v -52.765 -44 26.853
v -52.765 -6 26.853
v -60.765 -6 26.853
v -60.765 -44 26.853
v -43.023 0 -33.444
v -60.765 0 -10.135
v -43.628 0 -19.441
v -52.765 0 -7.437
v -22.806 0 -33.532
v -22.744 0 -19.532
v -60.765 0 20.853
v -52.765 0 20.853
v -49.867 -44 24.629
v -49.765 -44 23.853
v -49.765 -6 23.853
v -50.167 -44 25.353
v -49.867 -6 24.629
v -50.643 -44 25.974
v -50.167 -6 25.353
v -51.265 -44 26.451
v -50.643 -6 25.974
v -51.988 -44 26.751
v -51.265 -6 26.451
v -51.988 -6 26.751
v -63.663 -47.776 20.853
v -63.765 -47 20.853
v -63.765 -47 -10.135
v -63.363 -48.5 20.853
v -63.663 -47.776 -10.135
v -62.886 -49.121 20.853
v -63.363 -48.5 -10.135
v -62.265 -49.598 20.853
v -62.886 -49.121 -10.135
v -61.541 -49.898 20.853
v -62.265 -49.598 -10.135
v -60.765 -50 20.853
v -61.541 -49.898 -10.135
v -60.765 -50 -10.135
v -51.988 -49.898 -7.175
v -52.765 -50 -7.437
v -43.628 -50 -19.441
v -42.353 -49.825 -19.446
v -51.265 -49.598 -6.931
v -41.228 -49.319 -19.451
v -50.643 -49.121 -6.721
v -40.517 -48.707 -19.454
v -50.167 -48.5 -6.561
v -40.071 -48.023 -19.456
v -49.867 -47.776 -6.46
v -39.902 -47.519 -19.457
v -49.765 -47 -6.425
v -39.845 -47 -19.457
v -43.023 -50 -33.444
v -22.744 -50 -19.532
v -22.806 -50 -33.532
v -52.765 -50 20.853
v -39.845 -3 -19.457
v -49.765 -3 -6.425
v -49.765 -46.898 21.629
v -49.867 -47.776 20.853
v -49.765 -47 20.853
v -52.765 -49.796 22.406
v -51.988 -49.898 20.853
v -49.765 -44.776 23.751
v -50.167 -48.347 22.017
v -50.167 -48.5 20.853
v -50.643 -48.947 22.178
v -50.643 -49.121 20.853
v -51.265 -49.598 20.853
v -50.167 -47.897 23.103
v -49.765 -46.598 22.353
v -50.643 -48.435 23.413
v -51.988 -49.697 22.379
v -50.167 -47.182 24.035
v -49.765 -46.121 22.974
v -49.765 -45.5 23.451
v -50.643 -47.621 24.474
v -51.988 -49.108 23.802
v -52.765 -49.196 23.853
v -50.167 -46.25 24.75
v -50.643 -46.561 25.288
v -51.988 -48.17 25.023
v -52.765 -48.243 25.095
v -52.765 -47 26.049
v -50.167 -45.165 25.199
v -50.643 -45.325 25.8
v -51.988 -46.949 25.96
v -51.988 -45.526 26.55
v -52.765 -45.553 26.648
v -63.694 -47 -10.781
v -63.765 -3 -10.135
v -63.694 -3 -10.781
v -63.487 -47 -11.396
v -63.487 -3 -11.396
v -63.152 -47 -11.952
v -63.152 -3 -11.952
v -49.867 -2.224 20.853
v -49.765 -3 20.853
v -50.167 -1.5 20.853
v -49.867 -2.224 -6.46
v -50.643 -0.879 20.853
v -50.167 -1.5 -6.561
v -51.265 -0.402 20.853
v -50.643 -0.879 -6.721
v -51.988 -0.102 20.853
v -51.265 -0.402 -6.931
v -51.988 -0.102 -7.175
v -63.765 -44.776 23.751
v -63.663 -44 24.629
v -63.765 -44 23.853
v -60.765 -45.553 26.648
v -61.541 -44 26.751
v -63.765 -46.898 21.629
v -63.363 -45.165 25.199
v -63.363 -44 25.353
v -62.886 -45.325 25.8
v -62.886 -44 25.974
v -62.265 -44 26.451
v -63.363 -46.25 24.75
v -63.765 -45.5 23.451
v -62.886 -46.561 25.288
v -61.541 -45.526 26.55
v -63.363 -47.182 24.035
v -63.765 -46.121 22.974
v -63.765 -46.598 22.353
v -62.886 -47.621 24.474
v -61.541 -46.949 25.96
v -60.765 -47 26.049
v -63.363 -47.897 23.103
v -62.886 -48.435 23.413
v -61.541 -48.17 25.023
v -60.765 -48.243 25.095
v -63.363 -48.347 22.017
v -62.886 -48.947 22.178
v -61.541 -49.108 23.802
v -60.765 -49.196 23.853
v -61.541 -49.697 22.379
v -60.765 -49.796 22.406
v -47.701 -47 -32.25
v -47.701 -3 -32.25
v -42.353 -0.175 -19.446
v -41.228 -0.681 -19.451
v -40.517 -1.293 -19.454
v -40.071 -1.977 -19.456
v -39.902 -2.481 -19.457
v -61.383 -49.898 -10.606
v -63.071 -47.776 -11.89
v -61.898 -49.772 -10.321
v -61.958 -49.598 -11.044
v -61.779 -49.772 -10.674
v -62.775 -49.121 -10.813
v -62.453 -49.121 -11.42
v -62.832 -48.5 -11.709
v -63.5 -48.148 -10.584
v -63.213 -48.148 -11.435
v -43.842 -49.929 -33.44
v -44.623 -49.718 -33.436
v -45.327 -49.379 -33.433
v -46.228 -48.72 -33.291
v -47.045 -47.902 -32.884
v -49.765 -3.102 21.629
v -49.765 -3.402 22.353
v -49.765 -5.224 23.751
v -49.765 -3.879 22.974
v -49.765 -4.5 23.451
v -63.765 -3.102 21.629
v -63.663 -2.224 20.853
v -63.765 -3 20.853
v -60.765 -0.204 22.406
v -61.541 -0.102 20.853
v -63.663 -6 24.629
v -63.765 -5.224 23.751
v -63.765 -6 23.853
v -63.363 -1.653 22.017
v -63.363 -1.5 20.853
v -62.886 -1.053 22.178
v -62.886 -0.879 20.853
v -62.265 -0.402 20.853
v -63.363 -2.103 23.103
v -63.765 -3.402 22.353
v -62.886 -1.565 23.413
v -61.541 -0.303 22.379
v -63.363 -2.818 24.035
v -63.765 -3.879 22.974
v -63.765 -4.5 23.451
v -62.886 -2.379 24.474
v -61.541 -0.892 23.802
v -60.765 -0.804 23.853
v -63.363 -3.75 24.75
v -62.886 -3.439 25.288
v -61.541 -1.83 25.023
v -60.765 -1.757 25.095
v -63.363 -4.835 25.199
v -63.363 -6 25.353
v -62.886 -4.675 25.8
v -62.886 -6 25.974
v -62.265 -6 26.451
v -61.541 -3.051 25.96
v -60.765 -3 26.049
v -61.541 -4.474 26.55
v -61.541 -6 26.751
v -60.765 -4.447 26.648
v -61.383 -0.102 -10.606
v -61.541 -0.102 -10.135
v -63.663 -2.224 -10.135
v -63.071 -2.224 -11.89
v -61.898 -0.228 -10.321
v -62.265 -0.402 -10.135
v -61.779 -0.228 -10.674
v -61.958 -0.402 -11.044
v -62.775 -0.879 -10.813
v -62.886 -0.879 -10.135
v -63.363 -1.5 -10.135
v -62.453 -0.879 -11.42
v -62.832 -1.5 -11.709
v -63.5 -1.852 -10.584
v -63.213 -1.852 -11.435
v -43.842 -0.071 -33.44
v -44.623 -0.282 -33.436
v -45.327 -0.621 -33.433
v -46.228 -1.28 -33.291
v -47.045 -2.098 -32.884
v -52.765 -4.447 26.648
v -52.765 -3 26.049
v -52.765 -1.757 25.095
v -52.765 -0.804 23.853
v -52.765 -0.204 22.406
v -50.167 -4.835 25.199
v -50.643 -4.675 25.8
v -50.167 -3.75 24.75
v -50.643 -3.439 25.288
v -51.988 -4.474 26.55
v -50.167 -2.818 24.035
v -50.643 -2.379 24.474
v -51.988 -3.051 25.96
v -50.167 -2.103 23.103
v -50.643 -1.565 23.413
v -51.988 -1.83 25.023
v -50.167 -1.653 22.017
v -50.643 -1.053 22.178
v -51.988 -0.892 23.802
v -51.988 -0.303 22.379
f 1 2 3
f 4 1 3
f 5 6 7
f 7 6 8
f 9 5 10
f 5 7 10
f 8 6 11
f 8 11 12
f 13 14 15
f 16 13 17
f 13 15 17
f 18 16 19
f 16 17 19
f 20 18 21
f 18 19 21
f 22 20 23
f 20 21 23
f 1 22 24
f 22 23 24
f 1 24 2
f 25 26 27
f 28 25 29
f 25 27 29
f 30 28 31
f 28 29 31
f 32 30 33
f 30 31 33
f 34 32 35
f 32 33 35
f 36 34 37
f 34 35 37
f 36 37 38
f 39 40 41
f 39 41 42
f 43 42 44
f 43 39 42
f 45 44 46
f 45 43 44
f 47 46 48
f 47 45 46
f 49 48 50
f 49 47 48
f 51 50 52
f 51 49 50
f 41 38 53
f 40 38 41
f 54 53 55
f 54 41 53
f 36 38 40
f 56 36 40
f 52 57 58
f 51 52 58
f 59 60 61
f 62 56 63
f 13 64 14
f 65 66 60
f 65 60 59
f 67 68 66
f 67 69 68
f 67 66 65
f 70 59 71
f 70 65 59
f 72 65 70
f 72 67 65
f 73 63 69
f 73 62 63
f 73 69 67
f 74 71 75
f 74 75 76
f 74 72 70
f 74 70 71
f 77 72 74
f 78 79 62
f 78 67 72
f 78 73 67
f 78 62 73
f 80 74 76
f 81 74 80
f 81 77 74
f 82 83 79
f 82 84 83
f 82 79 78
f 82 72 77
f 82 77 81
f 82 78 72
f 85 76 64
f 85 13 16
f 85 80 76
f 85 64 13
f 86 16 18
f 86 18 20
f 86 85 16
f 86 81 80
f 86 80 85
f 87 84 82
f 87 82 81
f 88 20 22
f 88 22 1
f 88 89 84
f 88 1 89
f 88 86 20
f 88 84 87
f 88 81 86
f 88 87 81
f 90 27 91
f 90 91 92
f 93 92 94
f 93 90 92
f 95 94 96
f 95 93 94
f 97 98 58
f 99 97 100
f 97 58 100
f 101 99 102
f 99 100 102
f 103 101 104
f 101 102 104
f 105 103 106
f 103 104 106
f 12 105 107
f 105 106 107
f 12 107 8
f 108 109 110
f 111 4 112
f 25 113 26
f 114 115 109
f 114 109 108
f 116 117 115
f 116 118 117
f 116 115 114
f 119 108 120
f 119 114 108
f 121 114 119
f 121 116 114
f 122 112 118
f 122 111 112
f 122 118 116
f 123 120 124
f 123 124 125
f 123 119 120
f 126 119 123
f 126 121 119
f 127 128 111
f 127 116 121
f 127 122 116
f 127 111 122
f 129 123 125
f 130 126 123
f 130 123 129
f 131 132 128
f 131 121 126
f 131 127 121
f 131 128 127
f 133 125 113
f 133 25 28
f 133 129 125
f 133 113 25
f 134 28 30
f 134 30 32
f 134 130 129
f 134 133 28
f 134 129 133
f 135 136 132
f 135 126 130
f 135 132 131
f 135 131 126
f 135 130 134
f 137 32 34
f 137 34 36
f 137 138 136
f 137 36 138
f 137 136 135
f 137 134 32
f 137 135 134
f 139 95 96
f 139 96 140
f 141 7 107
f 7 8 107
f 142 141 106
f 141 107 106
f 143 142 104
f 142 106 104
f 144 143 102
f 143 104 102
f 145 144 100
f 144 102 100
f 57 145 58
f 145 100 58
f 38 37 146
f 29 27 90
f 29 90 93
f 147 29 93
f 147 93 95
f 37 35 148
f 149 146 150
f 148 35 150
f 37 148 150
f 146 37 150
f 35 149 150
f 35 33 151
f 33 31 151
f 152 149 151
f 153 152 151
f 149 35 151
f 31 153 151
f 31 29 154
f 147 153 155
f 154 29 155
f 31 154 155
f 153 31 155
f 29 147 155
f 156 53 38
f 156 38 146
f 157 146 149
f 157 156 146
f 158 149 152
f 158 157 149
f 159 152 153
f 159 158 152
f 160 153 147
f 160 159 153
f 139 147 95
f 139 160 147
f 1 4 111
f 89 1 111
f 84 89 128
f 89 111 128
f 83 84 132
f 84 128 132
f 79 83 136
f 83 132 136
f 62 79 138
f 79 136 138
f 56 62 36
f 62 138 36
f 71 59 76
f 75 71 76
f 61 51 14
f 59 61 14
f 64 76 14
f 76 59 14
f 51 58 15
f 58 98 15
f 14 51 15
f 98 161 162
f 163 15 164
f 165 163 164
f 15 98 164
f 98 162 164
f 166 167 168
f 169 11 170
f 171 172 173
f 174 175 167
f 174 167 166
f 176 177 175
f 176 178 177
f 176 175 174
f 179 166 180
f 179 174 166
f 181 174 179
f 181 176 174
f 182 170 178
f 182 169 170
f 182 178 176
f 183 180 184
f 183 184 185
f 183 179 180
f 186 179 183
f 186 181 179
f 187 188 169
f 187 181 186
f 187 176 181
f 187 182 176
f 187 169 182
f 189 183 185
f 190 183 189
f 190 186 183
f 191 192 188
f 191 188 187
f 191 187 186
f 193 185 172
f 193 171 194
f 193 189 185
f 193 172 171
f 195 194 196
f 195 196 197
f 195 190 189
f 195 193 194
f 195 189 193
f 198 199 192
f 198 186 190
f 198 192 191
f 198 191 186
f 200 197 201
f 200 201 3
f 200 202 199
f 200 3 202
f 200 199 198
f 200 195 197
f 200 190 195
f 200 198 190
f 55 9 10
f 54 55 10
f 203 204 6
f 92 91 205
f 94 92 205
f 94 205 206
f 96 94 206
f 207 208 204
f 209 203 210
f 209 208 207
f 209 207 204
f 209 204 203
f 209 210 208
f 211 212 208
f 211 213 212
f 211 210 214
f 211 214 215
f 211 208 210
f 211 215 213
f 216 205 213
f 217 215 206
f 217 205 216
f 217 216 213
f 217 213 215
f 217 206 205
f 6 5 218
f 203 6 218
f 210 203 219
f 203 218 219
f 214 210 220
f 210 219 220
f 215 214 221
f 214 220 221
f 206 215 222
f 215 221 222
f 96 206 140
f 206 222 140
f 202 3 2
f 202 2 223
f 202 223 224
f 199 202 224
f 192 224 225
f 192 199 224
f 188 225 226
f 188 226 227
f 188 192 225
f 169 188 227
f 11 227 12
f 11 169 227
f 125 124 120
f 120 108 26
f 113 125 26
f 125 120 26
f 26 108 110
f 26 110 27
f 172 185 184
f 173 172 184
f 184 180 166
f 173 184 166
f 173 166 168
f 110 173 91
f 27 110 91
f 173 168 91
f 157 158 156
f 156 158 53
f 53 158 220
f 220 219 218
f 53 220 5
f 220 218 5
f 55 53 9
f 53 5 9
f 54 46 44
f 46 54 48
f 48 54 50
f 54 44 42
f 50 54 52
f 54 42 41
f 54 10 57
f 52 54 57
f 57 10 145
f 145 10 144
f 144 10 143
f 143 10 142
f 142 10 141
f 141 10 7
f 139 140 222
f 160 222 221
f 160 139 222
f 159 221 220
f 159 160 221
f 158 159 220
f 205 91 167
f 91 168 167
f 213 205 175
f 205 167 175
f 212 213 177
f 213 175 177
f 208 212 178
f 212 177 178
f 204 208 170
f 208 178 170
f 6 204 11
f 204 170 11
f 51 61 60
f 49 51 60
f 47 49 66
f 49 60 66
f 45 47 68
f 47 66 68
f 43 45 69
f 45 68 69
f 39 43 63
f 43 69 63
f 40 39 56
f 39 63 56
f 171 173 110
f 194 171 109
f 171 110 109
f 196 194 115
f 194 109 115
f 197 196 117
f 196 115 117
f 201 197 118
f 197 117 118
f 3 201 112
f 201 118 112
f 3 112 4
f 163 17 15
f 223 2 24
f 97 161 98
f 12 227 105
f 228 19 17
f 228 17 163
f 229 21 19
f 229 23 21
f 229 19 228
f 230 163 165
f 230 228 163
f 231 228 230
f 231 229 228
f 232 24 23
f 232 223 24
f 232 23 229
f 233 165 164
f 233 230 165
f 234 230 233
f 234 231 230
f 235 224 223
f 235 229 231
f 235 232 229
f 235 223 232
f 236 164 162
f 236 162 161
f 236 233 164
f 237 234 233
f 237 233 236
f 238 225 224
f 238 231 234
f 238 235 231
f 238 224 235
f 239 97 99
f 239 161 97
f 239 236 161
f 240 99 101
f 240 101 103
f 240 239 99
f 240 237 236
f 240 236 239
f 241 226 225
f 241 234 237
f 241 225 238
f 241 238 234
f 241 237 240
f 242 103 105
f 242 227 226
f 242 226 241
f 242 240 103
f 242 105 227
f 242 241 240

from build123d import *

# Parameters (mm, degrees)
F1_DEPTH = 50
F2_R     = 6
F3_R     = 3


with BuildPart() as f1:
    # F0 (on Front) → F1 (new body)
    with BuildSketch(Plane.XZ):
        Polygon((-49.764752, 26.852785), (-63.764751, 26.852785), (-63.764751, -11.147215), (-46.805562, -33.426935), (-22.805792, -33.532045), (-22.744477, -19.532181), (-39.844699, -19.457288), (-49.764752, -6.42506), align=None)
    extrude(amount=F1_DEPTH)

    # F2
    f2_edges = [f1.edges().sort_by_distance(p)[0] for p in [
        (-56.764752, -50, 26.852785),
        (-56.764752, 0, 26.852785),
    ]]
    fillet(f2_edges, radius=F2_R)

    # F3
    f3_edges = [f1.edges().sort_by_distance(p)[0] for p in [
        (-63.764751, -25, -11.147215),
        (-63.764751, -50, 4.852785),
        (-55.285157, -50, -22.287075),
        (-44.804725, -50, -12.941174),
        (-49.764752, -50, 7.213862),
        (-46.805562, -25, -33.426935),
        (-55.285157, 0, -22.287075),
        (-44.804725, 0, -12.941174),
    ]]
    fillet(f3_edges, radius=F3_R)


solid = f1.part
